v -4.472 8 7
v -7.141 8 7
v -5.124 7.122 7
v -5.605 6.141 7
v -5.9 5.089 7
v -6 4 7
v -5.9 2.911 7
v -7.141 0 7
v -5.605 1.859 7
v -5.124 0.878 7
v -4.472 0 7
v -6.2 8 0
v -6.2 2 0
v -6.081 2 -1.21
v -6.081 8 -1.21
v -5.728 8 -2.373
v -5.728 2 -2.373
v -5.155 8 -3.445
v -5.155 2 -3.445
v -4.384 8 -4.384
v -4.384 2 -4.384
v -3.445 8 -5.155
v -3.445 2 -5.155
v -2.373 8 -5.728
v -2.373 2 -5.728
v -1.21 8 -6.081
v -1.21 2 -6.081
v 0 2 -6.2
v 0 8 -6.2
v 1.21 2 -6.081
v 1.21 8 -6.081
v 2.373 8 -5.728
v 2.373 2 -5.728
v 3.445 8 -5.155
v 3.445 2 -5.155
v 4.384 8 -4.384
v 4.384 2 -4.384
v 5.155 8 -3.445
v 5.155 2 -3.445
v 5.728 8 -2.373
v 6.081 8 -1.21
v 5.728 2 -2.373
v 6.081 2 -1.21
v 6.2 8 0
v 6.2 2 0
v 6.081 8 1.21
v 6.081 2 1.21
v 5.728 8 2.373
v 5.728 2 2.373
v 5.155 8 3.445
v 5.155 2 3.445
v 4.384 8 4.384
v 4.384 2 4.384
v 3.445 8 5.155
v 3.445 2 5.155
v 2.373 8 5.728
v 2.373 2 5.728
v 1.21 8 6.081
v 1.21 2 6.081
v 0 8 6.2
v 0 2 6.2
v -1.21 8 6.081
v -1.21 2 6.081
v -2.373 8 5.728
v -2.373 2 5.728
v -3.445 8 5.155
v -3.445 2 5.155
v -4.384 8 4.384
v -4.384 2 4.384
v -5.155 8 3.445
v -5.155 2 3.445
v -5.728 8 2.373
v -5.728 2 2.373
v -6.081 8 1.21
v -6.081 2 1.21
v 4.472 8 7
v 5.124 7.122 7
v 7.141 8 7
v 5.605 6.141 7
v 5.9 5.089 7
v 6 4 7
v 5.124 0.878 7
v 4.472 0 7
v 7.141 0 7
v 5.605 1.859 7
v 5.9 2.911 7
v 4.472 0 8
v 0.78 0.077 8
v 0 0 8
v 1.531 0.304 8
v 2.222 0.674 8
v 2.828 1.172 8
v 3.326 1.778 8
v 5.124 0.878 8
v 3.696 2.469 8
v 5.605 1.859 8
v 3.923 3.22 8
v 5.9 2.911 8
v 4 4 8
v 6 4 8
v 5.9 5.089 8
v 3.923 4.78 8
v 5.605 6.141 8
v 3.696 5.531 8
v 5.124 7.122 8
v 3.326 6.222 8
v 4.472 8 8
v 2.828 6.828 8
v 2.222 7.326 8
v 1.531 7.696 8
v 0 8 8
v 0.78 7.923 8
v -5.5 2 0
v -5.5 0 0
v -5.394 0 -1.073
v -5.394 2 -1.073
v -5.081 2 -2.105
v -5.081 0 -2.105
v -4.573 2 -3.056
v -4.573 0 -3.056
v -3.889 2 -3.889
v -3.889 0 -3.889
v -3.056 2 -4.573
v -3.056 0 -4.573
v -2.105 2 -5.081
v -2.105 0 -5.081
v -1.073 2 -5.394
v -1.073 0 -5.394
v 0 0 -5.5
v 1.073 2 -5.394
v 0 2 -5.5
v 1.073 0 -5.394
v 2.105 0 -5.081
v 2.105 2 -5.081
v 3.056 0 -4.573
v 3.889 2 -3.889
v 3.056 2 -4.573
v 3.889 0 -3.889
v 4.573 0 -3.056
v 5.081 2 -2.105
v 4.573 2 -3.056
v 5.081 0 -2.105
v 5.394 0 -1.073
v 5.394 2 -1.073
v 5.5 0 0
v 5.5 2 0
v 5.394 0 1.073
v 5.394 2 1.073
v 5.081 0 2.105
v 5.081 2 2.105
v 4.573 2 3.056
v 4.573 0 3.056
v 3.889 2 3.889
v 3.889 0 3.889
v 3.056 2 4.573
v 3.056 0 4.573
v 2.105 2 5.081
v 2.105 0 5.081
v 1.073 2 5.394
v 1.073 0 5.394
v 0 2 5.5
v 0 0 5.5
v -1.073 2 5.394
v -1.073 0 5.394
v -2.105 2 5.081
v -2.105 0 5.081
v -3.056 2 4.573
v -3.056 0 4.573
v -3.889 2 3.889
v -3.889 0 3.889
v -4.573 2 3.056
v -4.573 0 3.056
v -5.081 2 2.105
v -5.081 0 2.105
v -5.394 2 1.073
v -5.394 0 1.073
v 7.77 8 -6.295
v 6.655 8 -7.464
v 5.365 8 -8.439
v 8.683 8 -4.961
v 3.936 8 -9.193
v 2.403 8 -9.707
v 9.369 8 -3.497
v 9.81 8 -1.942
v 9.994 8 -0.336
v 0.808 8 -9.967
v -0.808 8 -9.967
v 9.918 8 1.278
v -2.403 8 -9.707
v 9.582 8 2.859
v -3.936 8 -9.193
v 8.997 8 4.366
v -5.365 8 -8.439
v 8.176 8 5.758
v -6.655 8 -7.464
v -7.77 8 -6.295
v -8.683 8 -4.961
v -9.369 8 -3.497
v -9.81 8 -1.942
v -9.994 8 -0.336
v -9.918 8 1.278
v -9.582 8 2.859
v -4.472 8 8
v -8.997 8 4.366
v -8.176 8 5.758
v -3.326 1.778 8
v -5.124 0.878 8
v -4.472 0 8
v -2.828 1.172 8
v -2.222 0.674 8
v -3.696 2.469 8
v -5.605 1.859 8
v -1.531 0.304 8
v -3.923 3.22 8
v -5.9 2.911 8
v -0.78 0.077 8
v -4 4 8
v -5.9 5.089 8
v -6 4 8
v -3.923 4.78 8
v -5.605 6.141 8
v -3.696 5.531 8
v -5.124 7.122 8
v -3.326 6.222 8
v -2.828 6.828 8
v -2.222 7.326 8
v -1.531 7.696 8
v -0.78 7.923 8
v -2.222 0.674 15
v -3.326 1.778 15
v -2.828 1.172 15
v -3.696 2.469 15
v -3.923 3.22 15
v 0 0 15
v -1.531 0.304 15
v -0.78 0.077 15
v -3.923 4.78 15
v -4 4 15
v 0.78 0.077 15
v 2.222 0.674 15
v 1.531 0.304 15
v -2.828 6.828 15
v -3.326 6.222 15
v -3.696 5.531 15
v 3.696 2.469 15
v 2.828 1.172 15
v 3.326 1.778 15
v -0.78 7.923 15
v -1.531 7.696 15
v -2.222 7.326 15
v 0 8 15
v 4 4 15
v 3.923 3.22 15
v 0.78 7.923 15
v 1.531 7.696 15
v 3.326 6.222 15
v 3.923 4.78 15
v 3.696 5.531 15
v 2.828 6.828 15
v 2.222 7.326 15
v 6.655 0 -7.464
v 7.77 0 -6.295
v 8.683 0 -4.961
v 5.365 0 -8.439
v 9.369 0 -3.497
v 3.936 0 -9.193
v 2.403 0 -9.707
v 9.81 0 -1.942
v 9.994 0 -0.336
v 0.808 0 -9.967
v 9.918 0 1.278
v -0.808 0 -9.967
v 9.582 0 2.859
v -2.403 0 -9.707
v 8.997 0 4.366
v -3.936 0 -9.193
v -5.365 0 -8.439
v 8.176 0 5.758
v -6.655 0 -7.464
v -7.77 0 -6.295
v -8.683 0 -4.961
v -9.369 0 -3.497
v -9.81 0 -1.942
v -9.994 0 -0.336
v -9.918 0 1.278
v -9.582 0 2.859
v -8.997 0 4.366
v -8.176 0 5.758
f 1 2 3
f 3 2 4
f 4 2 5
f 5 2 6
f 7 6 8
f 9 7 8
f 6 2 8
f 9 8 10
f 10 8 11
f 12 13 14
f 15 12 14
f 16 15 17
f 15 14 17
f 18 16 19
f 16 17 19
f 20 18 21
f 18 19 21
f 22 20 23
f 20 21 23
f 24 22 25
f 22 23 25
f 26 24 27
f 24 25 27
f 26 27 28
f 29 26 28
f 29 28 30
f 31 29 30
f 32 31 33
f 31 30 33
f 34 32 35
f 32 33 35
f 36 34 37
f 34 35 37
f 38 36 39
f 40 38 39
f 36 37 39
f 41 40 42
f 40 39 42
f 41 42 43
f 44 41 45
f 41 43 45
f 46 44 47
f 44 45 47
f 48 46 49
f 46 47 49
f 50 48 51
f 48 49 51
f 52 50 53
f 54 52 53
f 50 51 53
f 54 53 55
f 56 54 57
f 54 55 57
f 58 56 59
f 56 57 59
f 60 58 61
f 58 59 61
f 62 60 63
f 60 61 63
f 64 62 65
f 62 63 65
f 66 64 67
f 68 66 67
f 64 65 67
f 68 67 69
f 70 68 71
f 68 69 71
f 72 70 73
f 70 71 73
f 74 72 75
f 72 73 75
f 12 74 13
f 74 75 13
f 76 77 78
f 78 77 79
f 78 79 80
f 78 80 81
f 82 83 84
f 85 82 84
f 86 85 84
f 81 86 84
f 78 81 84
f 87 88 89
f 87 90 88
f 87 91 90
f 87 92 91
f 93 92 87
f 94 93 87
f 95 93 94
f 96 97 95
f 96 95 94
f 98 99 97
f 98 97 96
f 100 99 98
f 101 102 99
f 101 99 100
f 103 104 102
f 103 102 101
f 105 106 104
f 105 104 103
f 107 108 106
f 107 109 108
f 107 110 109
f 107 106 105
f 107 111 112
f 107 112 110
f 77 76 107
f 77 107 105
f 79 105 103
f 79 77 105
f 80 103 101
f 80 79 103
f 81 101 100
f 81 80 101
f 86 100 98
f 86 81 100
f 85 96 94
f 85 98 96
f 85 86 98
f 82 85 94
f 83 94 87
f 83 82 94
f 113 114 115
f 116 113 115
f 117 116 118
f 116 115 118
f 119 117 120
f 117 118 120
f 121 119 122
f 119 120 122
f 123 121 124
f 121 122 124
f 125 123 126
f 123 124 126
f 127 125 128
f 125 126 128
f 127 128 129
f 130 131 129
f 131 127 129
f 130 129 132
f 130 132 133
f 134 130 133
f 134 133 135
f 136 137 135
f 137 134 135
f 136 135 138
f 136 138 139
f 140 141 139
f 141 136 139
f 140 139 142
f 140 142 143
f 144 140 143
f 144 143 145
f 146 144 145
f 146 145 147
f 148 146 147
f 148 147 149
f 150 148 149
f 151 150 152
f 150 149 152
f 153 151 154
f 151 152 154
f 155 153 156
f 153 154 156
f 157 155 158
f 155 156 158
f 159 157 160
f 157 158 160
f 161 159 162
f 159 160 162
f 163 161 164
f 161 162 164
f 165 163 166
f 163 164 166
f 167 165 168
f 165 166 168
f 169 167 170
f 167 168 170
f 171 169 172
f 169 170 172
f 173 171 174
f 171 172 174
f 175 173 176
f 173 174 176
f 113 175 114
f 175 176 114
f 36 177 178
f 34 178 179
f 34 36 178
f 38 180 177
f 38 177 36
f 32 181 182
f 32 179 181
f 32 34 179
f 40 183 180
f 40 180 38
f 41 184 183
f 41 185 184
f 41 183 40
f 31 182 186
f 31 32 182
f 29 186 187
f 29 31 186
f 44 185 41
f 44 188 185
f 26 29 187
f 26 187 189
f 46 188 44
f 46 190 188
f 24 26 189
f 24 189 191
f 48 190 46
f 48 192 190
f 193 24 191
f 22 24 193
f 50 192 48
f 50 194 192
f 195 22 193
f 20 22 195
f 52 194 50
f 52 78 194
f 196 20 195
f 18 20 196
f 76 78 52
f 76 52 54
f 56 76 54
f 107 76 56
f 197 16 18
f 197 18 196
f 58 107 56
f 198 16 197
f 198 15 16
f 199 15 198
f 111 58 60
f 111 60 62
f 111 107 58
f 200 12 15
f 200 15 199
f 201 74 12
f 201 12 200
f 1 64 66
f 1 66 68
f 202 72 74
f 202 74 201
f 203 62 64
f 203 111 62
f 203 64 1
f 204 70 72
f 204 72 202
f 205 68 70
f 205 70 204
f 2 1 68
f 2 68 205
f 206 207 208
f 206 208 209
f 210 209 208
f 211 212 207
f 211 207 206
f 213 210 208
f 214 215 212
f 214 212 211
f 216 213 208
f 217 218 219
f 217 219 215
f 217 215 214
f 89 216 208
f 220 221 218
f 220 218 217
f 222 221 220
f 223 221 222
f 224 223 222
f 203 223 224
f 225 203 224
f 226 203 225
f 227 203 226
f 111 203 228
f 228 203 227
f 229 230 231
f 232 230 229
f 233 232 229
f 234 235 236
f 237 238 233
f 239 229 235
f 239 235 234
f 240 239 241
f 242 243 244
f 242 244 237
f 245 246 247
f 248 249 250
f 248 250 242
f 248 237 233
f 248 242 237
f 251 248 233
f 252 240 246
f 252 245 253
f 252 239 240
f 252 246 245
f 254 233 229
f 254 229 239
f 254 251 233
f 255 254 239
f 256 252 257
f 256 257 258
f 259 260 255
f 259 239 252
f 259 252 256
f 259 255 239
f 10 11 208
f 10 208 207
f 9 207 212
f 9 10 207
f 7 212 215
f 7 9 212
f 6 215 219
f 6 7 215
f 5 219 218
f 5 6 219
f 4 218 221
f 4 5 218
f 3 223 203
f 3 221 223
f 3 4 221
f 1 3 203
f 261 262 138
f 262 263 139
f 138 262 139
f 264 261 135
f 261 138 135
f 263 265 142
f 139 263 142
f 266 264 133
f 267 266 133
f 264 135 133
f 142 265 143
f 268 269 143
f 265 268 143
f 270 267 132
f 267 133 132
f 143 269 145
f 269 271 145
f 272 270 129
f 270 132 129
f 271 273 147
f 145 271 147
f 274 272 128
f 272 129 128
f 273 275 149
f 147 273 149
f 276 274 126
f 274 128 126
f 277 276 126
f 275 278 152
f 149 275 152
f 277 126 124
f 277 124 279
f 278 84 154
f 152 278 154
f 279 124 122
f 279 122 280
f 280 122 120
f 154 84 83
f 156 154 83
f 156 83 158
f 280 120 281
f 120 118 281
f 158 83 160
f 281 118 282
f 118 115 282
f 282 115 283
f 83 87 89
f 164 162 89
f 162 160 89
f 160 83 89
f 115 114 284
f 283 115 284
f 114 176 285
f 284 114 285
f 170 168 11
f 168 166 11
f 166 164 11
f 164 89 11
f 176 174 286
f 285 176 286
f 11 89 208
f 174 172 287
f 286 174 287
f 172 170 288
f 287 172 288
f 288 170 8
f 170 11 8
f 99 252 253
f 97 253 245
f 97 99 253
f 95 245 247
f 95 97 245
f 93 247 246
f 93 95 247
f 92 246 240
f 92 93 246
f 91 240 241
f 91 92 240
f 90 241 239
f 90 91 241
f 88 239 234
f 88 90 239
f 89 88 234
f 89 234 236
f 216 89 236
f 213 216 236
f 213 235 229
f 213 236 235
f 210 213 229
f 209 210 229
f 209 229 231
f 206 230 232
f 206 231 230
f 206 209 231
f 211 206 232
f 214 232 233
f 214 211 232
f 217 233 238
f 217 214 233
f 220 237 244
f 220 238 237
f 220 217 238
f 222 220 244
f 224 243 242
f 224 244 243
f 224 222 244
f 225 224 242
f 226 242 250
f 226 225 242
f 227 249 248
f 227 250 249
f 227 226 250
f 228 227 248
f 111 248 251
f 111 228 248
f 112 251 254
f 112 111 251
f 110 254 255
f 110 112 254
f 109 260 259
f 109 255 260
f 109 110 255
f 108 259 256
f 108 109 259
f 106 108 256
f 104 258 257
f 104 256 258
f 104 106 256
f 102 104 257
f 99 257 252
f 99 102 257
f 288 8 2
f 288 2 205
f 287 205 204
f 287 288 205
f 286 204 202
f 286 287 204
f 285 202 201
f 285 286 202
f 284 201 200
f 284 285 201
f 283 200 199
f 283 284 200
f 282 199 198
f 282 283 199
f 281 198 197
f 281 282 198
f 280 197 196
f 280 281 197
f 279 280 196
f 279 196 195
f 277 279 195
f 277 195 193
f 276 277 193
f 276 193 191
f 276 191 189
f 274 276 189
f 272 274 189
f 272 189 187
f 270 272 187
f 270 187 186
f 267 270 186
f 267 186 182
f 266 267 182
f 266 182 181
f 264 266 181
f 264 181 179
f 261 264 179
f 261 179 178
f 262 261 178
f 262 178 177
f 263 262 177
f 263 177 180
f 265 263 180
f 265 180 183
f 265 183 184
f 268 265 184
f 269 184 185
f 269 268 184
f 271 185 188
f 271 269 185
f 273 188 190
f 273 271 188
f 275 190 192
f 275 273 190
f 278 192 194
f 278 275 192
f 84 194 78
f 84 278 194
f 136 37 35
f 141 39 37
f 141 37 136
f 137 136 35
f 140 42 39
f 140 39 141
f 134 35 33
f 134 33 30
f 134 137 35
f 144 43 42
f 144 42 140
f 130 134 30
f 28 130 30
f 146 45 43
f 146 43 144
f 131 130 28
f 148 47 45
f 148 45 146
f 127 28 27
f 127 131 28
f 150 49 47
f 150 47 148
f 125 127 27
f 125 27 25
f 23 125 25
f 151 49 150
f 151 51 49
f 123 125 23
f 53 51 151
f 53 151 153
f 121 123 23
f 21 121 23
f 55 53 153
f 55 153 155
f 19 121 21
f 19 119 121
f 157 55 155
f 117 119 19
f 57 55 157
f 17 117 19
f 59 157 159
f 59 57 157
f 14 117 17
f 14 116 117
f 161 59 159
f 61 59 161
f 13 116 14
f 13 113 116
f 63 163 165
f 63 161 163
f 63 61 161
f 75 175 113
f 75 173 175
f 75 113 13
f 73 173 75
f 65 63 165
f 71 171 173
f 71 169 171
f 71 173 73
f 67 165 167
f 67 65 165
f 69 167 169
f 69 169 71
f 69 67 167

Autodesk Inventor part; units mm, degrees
ref_plane "YZ Plane" through (0, 0, 0) normal (1, 0, 0) x (0, 1, 0)
ref_plane "XZ Plane" through (0, 0, 0) normal (0, 1, 0) x (-1, 0, 0)
ref_plane "XY Plane" through (0, 0, 0) normal (0, 0, 1) x (1, 0, 0)
sketch "Sketch1" plane through (0, 0, 0) normal (0, 1, 0) x (-1, 0, 0)
  line L0 (0, -19.6) -> (0, 19.6) projected
  line L1 (19.6, 0) -> (-19.6, 0) projected
  circle A0 centre (0, 0) radius 2
  circle A1 centre (0, 0) radius 6.2
  circle A2 centre (0, 0) radius 14
  line L2 (4, -13.4164) -> (-4, -13.4164)
  circle A3 centre (0, 0) radius 10
  line L3 (6, 8) -> (-6, 8)
  line L4 (7.1414, 7) -> (-7.1414, 7)
  dimension "d0" = 4
  dimension "d1" = 12.4
  dimension "d2" = 28
  dimension "d3" = 8
  dimension "d4" = 20
  dimension "d5" = 12
  dimension "d7" = 1
extrude "Extrusion1" add sketch "Sketch1" along normal blind 8 contours A3 L1 A1 L0 | L0 A1 L1 A3 | A3 L4 L0 A1 L1 | L1 A1 L0 L4 A3
sketch "Sketch2" plane through (-7.1414, 0, 7) normal (0, 0, 1) x (1, 0, 0)
  line L0 (0, 0) -> (14.2829, 0) projected
  line L1 (14.2829, 0) -> (14.2829, 8) projected
  line L2 (0, 8) -> (14.2829, 8) projected
  line L3 (0, 0) -> (0, 8) projected
  line L4 (7.1414, -4) -> (7.1414, 10) projected
  line L5 (2.6693, 8) -> (11.6136, 8)
  line L6 (2.6693, 0) -> (11.6136, 0)
  arc A0 (2.6693, 8) -> (2.6693, 0) centre (7.1414, 4) ccw
  arc A1 (11.6136, 0) -> (11.6136, 8) centre (7.1414, 4) ccw
  point P0 (7.1414, 0)
  dimension "d10" = 4
  dimension "d26" = 8
  dimension "d27" = 6
  dimension "d28" = 6
extrude "Extrusion2" add sketch "Sketch2" along normal blind 1 contours A0 L2 L4 L0 | L4 L2 A1 L0
sketch "Sketch3" plane through (-7.1414, 0, 8) normal (0, 0, 1) x (1, 0, 0)
  arc A0 (2.6693, 8) -> (2.6693, 0) centre (7.1414, 4) ccw projected
  circle A1 centre (7.1414, 4) radius 4
  point P0 (7.1414, 0)
  point P1 (6.5905, 0)
  point P2 (6.5905, 4)
  dimension "d14" = 8
extrude "Extrusion3" add sketch "Sketch3" along normal blind 7
sketch "Sketch4" plane through (0, 0, 0) normal (0, 1, 0) x (-1, 0, 0)
  circle A0 centre (0, 0) radius 5.5
  circle A1 centre (0, 0) radius 6.2 projected
  circle A2 centre (0, 0) radius 6.5
  dimension "d29" = 11
  dimension "d30" = 13
extrude "Extrusion4" add sketch "Sketch4" along normal blind 2 contours A1
properties part number "borde libre chico"
